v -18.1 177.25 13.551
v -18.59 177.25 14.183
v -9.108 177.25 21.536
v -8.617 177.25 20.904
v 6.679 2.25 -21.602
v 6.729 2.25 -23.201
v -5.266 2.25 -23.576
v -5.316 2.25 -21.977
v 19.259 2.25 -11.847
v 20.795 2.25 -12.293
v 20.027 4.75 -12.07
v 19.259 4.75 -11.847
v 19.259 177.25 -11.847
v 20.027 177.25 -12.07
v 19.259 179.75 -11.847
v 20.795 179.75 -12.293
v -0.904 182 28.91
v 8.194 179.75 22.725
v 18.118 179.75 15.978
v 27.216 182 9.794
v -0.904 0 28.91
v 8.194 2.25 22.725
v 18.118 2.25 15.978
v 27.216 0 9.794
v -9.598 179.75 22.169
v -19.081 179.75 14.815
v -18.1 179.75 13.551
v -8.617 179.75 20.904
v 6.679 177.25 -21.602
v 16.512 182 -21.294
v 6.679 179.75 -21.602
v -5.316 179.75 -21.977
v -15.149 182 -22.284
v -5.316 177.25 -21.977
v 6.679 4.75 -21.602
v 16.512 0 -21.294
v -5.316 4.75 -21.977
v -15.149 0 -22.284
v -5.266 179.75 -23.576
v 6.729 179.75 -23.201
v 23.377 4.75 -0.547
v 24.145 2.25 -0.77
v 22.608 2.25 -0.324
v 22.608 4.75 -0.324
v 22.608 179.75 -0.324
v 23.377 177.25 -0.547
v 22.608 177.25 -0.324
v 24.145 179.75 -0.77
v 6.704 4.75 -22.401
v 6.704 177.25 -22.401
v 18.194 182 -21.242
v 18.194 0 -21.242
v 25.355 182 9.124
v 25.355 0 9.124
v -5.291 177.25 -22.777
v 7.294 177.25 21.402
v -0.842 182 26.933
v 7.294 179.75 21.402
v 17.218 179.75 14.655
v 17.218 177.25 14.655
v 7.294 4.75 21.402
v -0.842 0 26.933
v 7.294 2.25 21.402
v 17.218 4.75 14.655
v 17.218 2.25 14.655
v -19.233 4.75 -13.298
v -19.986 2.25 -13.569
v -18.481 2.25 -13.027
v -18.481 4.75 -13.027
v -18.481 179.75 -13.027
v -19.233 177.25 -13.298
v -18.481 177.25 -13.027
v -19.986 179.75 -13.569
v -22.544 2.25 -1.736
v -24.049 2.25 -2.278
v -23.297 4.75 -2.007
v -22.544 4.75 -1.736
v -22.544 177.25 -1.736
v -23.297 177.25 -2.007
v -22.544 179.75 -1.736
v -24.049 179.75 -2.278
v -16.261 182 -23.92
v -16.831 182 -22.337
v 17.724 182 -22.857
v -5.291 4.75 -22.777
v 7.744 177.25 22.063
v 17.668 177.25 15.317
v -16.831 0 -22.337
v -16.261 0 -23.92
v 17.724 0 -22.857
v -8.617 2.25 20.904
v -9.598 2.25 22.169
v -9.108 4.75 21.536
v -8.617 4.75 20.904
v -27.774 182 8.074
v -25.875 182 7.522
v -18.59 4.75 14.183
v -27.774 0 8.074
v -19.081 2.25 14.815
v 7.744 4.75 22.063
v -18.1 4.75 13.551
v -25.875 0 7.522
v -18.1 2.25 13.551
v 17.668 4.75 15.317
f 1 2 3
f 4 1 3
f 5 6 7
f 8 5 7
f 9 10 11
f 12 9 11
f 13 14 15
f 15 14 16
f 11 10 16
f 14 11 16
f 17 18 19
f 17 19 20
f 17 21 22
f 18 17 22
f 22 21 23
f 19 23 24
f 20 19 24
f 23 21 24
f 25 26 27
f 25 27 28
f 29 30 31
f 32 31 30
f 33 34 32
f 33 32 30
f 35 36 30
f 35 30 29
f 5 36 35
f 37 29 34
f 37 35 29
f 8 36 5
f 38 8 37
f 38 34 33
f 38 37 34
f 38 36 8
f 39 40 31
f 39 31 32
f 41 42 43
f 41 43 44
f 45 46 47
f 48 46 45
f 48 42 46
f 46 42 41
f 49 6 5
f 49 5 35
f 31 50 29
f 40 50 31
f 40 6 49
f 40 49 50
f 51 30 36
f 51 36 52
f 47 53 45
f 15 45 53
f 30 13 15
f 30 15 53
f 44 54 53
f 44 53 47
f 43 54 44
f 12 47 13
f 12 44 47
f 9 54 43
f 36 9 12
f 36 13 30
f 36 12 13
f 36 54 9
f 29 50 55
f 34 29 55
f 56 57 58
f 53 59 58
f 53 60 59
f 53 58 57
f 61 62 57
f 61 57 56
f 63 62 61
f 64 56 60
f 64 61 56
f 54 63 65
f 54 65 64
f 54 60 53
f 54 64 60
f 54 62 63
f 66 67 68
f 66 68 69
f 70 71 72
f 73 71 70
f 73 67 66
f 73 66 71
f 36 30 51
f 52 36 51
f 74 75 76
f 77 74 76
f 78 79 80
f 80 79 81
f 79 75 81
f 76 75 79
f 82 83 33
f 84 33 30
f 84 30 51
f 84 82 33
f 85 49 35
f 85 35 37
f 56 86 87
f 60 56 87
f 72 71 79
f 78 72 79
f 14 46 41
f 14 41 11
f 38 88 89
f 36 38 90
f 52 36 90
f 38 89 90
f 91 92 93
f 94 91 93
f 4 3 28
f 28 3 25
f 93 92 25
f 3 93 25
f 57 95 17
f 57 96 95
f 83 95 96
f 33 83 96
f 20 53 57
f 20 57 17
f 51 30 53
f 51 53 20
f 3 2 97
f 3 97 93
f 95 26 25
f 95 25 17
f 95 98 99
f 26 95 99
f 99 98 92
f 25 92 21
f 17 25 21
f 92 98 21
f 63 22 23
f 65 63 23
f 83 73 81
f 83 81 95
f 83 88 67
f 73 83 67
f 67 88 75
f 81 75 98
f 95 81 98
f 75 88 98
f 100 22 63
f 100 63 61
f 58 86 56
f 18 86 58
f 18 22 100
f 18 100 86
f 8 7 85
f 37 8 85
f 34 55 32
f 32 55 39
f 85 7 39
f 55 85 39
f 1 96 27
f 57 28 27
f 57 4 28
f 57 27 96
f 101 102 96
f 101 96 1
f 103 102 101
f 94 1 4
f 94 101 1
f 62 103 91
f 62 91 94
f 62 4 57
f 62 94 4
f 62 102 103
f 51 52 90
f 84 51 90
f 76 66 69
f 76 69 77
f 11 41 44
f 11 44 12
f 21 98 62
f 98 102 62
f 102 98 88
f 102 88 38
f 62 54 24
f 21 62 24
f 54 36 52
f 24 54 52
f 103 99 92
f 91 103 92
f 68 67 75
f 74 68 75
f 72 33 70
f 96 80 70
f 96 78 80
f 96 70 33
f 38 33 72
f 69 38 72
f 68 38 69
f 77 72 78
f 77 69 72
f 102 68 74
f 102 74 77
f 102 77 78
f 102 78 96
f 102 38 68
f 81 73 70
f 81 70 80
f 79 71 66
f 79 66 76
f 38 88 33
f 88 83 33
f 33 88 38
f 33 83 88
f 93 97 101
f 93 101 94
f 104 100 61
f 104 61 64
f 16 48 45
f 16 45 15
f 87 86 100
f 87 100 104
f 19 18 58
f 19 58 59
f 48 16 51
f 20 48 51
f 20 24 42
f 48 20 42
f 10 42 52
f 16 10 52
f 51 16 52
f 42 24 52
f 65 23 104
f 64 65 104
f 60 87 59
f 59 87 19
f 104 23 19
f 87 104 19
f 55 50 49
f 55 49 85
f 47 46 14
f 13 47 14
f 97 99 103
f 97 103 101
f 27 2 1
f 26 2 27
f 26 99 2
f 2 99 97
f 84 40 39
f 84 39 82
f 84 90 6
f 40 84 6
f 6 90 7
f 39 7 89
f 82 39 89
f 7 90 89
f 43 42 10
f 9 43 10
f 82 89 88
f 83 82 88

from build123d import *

# Parameters (mm, degrees)
BOSS_EXTRUDE2_DEPTH = 182
SKETCH3_W           = 12
SKETCH3_H           = 175
CUT_EXTRUDE1_DEPTH  = 0.8
SKETCH4_W           = 12
SKETCH4_H           = 2.5
CUT_EXTRUDE2_DEPTH  = 5
CIRPATTERN1_COUNT   = 5


with BuildPart() as part:
    # Sketch2 → Boss-Extrude2 (new body)
    with BuildSketch(Plane(origin=(0, 0, 0), x_dir=(1, 0, 0), z_dir=(0, 1, 0))):
        Polygon((17.724257502, 22.857119952), (-16.261316093, 23.920009101), (-27.774303549, -8.073741316), (-0.904147515, -28.909855651), (27.215509654, -9.793532086), align=None)
        Polygon((25.354620105, -9.123888867), (16.512342459, 21.294239955), (-15.149431232, 22.284452924), (-25.875205871, -7.521690627), (-0.842325462, -26.933113384), align=None, mode=Mode.SUBTRACT)
    extrude(amount=BOSS_EXTRUDE2_DEPTH)

    # Sketch3 → Cut-Extrude1 (cut)
    with BuildSketch(Plane(origin=(0.731470705, 0, -23.388564526), x_dir=(-0.999511304549409, 0, -0.03125943182367235), z_dir=(0.03125943182367234, 0, -0.9995113045494088))):
        with Locations((0, 91)):
            Rectangle(SKETCH3_W, SKETCH3_H)
    cut_extrude1 = extrude(amount=-CUT_EXTRUDE1_DEPTH, mode=Mode.SUBTRACT)

    # Sketch4 → Cut-Extrude2 (cut)
    with BuildSketch(Plane(origin=(0.731470705, 0, -23.388564526), x_dir=(-0.999511304549409, 0, -0.03125943182367227), z_dir=(0.031259431823672267, 0, -0.9995113045494088))):
        with Locations((0, 3.5)):
            Rectangle(SKETCH4_W, SKETCH4_H)
        with Locations((0, 178.5)):
            Rectangle(SKETCH4_W, SKETCH4_H)
    cut_extrude2 = extrude(amount=-CUT_EXTRUDE2_DEPTH, mode=Mode.SUBTRACT)

    # CirPattern1: Cut-Extrude1, Cut-Extrude2 ×5 about axis
    cirpattern1_axis = Axis((0, 0, 0), (0, 1, 0))
    add([cut_extrude1.rotate(cirpattern1_axis, i * 360 / CIRPATTERN1_COUNT) for i in range(1, CIRPATTERN1_COUNT)], mode=Mode.SUBTRACT)
    add([cut_extrude2.rotate(cirpattern1_axis, i * 360 / CIRPATTERN1_COUNT) for i in range(1, CIRPATTERN1_COUNT)], mode=Mode.SUBTRACT)


with BuildPart() as body_2:
    # Split1: the piece on the far side of the plane
    add(part.part)
    split(bisect_by=Plane(origin=(0.681455614, 0, -21.789346439), x_dir=(0.999511304549409, 0, 0.03125943182367256), z_dir=(-0.03125943182367256, 0, 0.999511304549409)), keep=Keep.BOTTOM)


with BuildPart() as part_1:
    add(part.part)

    # Split1
    split(bisect_by=Plane(origin=(0.681455614, 0, -21.789346439), x_dir=(0.999511304549409, 0, 0.03125943182367256), z_dir=(-0.03125943182367256, 0, 0.999511304549409)), keep=Keep.TOP)


solid = Compound([body_2.part, part_1.part])
